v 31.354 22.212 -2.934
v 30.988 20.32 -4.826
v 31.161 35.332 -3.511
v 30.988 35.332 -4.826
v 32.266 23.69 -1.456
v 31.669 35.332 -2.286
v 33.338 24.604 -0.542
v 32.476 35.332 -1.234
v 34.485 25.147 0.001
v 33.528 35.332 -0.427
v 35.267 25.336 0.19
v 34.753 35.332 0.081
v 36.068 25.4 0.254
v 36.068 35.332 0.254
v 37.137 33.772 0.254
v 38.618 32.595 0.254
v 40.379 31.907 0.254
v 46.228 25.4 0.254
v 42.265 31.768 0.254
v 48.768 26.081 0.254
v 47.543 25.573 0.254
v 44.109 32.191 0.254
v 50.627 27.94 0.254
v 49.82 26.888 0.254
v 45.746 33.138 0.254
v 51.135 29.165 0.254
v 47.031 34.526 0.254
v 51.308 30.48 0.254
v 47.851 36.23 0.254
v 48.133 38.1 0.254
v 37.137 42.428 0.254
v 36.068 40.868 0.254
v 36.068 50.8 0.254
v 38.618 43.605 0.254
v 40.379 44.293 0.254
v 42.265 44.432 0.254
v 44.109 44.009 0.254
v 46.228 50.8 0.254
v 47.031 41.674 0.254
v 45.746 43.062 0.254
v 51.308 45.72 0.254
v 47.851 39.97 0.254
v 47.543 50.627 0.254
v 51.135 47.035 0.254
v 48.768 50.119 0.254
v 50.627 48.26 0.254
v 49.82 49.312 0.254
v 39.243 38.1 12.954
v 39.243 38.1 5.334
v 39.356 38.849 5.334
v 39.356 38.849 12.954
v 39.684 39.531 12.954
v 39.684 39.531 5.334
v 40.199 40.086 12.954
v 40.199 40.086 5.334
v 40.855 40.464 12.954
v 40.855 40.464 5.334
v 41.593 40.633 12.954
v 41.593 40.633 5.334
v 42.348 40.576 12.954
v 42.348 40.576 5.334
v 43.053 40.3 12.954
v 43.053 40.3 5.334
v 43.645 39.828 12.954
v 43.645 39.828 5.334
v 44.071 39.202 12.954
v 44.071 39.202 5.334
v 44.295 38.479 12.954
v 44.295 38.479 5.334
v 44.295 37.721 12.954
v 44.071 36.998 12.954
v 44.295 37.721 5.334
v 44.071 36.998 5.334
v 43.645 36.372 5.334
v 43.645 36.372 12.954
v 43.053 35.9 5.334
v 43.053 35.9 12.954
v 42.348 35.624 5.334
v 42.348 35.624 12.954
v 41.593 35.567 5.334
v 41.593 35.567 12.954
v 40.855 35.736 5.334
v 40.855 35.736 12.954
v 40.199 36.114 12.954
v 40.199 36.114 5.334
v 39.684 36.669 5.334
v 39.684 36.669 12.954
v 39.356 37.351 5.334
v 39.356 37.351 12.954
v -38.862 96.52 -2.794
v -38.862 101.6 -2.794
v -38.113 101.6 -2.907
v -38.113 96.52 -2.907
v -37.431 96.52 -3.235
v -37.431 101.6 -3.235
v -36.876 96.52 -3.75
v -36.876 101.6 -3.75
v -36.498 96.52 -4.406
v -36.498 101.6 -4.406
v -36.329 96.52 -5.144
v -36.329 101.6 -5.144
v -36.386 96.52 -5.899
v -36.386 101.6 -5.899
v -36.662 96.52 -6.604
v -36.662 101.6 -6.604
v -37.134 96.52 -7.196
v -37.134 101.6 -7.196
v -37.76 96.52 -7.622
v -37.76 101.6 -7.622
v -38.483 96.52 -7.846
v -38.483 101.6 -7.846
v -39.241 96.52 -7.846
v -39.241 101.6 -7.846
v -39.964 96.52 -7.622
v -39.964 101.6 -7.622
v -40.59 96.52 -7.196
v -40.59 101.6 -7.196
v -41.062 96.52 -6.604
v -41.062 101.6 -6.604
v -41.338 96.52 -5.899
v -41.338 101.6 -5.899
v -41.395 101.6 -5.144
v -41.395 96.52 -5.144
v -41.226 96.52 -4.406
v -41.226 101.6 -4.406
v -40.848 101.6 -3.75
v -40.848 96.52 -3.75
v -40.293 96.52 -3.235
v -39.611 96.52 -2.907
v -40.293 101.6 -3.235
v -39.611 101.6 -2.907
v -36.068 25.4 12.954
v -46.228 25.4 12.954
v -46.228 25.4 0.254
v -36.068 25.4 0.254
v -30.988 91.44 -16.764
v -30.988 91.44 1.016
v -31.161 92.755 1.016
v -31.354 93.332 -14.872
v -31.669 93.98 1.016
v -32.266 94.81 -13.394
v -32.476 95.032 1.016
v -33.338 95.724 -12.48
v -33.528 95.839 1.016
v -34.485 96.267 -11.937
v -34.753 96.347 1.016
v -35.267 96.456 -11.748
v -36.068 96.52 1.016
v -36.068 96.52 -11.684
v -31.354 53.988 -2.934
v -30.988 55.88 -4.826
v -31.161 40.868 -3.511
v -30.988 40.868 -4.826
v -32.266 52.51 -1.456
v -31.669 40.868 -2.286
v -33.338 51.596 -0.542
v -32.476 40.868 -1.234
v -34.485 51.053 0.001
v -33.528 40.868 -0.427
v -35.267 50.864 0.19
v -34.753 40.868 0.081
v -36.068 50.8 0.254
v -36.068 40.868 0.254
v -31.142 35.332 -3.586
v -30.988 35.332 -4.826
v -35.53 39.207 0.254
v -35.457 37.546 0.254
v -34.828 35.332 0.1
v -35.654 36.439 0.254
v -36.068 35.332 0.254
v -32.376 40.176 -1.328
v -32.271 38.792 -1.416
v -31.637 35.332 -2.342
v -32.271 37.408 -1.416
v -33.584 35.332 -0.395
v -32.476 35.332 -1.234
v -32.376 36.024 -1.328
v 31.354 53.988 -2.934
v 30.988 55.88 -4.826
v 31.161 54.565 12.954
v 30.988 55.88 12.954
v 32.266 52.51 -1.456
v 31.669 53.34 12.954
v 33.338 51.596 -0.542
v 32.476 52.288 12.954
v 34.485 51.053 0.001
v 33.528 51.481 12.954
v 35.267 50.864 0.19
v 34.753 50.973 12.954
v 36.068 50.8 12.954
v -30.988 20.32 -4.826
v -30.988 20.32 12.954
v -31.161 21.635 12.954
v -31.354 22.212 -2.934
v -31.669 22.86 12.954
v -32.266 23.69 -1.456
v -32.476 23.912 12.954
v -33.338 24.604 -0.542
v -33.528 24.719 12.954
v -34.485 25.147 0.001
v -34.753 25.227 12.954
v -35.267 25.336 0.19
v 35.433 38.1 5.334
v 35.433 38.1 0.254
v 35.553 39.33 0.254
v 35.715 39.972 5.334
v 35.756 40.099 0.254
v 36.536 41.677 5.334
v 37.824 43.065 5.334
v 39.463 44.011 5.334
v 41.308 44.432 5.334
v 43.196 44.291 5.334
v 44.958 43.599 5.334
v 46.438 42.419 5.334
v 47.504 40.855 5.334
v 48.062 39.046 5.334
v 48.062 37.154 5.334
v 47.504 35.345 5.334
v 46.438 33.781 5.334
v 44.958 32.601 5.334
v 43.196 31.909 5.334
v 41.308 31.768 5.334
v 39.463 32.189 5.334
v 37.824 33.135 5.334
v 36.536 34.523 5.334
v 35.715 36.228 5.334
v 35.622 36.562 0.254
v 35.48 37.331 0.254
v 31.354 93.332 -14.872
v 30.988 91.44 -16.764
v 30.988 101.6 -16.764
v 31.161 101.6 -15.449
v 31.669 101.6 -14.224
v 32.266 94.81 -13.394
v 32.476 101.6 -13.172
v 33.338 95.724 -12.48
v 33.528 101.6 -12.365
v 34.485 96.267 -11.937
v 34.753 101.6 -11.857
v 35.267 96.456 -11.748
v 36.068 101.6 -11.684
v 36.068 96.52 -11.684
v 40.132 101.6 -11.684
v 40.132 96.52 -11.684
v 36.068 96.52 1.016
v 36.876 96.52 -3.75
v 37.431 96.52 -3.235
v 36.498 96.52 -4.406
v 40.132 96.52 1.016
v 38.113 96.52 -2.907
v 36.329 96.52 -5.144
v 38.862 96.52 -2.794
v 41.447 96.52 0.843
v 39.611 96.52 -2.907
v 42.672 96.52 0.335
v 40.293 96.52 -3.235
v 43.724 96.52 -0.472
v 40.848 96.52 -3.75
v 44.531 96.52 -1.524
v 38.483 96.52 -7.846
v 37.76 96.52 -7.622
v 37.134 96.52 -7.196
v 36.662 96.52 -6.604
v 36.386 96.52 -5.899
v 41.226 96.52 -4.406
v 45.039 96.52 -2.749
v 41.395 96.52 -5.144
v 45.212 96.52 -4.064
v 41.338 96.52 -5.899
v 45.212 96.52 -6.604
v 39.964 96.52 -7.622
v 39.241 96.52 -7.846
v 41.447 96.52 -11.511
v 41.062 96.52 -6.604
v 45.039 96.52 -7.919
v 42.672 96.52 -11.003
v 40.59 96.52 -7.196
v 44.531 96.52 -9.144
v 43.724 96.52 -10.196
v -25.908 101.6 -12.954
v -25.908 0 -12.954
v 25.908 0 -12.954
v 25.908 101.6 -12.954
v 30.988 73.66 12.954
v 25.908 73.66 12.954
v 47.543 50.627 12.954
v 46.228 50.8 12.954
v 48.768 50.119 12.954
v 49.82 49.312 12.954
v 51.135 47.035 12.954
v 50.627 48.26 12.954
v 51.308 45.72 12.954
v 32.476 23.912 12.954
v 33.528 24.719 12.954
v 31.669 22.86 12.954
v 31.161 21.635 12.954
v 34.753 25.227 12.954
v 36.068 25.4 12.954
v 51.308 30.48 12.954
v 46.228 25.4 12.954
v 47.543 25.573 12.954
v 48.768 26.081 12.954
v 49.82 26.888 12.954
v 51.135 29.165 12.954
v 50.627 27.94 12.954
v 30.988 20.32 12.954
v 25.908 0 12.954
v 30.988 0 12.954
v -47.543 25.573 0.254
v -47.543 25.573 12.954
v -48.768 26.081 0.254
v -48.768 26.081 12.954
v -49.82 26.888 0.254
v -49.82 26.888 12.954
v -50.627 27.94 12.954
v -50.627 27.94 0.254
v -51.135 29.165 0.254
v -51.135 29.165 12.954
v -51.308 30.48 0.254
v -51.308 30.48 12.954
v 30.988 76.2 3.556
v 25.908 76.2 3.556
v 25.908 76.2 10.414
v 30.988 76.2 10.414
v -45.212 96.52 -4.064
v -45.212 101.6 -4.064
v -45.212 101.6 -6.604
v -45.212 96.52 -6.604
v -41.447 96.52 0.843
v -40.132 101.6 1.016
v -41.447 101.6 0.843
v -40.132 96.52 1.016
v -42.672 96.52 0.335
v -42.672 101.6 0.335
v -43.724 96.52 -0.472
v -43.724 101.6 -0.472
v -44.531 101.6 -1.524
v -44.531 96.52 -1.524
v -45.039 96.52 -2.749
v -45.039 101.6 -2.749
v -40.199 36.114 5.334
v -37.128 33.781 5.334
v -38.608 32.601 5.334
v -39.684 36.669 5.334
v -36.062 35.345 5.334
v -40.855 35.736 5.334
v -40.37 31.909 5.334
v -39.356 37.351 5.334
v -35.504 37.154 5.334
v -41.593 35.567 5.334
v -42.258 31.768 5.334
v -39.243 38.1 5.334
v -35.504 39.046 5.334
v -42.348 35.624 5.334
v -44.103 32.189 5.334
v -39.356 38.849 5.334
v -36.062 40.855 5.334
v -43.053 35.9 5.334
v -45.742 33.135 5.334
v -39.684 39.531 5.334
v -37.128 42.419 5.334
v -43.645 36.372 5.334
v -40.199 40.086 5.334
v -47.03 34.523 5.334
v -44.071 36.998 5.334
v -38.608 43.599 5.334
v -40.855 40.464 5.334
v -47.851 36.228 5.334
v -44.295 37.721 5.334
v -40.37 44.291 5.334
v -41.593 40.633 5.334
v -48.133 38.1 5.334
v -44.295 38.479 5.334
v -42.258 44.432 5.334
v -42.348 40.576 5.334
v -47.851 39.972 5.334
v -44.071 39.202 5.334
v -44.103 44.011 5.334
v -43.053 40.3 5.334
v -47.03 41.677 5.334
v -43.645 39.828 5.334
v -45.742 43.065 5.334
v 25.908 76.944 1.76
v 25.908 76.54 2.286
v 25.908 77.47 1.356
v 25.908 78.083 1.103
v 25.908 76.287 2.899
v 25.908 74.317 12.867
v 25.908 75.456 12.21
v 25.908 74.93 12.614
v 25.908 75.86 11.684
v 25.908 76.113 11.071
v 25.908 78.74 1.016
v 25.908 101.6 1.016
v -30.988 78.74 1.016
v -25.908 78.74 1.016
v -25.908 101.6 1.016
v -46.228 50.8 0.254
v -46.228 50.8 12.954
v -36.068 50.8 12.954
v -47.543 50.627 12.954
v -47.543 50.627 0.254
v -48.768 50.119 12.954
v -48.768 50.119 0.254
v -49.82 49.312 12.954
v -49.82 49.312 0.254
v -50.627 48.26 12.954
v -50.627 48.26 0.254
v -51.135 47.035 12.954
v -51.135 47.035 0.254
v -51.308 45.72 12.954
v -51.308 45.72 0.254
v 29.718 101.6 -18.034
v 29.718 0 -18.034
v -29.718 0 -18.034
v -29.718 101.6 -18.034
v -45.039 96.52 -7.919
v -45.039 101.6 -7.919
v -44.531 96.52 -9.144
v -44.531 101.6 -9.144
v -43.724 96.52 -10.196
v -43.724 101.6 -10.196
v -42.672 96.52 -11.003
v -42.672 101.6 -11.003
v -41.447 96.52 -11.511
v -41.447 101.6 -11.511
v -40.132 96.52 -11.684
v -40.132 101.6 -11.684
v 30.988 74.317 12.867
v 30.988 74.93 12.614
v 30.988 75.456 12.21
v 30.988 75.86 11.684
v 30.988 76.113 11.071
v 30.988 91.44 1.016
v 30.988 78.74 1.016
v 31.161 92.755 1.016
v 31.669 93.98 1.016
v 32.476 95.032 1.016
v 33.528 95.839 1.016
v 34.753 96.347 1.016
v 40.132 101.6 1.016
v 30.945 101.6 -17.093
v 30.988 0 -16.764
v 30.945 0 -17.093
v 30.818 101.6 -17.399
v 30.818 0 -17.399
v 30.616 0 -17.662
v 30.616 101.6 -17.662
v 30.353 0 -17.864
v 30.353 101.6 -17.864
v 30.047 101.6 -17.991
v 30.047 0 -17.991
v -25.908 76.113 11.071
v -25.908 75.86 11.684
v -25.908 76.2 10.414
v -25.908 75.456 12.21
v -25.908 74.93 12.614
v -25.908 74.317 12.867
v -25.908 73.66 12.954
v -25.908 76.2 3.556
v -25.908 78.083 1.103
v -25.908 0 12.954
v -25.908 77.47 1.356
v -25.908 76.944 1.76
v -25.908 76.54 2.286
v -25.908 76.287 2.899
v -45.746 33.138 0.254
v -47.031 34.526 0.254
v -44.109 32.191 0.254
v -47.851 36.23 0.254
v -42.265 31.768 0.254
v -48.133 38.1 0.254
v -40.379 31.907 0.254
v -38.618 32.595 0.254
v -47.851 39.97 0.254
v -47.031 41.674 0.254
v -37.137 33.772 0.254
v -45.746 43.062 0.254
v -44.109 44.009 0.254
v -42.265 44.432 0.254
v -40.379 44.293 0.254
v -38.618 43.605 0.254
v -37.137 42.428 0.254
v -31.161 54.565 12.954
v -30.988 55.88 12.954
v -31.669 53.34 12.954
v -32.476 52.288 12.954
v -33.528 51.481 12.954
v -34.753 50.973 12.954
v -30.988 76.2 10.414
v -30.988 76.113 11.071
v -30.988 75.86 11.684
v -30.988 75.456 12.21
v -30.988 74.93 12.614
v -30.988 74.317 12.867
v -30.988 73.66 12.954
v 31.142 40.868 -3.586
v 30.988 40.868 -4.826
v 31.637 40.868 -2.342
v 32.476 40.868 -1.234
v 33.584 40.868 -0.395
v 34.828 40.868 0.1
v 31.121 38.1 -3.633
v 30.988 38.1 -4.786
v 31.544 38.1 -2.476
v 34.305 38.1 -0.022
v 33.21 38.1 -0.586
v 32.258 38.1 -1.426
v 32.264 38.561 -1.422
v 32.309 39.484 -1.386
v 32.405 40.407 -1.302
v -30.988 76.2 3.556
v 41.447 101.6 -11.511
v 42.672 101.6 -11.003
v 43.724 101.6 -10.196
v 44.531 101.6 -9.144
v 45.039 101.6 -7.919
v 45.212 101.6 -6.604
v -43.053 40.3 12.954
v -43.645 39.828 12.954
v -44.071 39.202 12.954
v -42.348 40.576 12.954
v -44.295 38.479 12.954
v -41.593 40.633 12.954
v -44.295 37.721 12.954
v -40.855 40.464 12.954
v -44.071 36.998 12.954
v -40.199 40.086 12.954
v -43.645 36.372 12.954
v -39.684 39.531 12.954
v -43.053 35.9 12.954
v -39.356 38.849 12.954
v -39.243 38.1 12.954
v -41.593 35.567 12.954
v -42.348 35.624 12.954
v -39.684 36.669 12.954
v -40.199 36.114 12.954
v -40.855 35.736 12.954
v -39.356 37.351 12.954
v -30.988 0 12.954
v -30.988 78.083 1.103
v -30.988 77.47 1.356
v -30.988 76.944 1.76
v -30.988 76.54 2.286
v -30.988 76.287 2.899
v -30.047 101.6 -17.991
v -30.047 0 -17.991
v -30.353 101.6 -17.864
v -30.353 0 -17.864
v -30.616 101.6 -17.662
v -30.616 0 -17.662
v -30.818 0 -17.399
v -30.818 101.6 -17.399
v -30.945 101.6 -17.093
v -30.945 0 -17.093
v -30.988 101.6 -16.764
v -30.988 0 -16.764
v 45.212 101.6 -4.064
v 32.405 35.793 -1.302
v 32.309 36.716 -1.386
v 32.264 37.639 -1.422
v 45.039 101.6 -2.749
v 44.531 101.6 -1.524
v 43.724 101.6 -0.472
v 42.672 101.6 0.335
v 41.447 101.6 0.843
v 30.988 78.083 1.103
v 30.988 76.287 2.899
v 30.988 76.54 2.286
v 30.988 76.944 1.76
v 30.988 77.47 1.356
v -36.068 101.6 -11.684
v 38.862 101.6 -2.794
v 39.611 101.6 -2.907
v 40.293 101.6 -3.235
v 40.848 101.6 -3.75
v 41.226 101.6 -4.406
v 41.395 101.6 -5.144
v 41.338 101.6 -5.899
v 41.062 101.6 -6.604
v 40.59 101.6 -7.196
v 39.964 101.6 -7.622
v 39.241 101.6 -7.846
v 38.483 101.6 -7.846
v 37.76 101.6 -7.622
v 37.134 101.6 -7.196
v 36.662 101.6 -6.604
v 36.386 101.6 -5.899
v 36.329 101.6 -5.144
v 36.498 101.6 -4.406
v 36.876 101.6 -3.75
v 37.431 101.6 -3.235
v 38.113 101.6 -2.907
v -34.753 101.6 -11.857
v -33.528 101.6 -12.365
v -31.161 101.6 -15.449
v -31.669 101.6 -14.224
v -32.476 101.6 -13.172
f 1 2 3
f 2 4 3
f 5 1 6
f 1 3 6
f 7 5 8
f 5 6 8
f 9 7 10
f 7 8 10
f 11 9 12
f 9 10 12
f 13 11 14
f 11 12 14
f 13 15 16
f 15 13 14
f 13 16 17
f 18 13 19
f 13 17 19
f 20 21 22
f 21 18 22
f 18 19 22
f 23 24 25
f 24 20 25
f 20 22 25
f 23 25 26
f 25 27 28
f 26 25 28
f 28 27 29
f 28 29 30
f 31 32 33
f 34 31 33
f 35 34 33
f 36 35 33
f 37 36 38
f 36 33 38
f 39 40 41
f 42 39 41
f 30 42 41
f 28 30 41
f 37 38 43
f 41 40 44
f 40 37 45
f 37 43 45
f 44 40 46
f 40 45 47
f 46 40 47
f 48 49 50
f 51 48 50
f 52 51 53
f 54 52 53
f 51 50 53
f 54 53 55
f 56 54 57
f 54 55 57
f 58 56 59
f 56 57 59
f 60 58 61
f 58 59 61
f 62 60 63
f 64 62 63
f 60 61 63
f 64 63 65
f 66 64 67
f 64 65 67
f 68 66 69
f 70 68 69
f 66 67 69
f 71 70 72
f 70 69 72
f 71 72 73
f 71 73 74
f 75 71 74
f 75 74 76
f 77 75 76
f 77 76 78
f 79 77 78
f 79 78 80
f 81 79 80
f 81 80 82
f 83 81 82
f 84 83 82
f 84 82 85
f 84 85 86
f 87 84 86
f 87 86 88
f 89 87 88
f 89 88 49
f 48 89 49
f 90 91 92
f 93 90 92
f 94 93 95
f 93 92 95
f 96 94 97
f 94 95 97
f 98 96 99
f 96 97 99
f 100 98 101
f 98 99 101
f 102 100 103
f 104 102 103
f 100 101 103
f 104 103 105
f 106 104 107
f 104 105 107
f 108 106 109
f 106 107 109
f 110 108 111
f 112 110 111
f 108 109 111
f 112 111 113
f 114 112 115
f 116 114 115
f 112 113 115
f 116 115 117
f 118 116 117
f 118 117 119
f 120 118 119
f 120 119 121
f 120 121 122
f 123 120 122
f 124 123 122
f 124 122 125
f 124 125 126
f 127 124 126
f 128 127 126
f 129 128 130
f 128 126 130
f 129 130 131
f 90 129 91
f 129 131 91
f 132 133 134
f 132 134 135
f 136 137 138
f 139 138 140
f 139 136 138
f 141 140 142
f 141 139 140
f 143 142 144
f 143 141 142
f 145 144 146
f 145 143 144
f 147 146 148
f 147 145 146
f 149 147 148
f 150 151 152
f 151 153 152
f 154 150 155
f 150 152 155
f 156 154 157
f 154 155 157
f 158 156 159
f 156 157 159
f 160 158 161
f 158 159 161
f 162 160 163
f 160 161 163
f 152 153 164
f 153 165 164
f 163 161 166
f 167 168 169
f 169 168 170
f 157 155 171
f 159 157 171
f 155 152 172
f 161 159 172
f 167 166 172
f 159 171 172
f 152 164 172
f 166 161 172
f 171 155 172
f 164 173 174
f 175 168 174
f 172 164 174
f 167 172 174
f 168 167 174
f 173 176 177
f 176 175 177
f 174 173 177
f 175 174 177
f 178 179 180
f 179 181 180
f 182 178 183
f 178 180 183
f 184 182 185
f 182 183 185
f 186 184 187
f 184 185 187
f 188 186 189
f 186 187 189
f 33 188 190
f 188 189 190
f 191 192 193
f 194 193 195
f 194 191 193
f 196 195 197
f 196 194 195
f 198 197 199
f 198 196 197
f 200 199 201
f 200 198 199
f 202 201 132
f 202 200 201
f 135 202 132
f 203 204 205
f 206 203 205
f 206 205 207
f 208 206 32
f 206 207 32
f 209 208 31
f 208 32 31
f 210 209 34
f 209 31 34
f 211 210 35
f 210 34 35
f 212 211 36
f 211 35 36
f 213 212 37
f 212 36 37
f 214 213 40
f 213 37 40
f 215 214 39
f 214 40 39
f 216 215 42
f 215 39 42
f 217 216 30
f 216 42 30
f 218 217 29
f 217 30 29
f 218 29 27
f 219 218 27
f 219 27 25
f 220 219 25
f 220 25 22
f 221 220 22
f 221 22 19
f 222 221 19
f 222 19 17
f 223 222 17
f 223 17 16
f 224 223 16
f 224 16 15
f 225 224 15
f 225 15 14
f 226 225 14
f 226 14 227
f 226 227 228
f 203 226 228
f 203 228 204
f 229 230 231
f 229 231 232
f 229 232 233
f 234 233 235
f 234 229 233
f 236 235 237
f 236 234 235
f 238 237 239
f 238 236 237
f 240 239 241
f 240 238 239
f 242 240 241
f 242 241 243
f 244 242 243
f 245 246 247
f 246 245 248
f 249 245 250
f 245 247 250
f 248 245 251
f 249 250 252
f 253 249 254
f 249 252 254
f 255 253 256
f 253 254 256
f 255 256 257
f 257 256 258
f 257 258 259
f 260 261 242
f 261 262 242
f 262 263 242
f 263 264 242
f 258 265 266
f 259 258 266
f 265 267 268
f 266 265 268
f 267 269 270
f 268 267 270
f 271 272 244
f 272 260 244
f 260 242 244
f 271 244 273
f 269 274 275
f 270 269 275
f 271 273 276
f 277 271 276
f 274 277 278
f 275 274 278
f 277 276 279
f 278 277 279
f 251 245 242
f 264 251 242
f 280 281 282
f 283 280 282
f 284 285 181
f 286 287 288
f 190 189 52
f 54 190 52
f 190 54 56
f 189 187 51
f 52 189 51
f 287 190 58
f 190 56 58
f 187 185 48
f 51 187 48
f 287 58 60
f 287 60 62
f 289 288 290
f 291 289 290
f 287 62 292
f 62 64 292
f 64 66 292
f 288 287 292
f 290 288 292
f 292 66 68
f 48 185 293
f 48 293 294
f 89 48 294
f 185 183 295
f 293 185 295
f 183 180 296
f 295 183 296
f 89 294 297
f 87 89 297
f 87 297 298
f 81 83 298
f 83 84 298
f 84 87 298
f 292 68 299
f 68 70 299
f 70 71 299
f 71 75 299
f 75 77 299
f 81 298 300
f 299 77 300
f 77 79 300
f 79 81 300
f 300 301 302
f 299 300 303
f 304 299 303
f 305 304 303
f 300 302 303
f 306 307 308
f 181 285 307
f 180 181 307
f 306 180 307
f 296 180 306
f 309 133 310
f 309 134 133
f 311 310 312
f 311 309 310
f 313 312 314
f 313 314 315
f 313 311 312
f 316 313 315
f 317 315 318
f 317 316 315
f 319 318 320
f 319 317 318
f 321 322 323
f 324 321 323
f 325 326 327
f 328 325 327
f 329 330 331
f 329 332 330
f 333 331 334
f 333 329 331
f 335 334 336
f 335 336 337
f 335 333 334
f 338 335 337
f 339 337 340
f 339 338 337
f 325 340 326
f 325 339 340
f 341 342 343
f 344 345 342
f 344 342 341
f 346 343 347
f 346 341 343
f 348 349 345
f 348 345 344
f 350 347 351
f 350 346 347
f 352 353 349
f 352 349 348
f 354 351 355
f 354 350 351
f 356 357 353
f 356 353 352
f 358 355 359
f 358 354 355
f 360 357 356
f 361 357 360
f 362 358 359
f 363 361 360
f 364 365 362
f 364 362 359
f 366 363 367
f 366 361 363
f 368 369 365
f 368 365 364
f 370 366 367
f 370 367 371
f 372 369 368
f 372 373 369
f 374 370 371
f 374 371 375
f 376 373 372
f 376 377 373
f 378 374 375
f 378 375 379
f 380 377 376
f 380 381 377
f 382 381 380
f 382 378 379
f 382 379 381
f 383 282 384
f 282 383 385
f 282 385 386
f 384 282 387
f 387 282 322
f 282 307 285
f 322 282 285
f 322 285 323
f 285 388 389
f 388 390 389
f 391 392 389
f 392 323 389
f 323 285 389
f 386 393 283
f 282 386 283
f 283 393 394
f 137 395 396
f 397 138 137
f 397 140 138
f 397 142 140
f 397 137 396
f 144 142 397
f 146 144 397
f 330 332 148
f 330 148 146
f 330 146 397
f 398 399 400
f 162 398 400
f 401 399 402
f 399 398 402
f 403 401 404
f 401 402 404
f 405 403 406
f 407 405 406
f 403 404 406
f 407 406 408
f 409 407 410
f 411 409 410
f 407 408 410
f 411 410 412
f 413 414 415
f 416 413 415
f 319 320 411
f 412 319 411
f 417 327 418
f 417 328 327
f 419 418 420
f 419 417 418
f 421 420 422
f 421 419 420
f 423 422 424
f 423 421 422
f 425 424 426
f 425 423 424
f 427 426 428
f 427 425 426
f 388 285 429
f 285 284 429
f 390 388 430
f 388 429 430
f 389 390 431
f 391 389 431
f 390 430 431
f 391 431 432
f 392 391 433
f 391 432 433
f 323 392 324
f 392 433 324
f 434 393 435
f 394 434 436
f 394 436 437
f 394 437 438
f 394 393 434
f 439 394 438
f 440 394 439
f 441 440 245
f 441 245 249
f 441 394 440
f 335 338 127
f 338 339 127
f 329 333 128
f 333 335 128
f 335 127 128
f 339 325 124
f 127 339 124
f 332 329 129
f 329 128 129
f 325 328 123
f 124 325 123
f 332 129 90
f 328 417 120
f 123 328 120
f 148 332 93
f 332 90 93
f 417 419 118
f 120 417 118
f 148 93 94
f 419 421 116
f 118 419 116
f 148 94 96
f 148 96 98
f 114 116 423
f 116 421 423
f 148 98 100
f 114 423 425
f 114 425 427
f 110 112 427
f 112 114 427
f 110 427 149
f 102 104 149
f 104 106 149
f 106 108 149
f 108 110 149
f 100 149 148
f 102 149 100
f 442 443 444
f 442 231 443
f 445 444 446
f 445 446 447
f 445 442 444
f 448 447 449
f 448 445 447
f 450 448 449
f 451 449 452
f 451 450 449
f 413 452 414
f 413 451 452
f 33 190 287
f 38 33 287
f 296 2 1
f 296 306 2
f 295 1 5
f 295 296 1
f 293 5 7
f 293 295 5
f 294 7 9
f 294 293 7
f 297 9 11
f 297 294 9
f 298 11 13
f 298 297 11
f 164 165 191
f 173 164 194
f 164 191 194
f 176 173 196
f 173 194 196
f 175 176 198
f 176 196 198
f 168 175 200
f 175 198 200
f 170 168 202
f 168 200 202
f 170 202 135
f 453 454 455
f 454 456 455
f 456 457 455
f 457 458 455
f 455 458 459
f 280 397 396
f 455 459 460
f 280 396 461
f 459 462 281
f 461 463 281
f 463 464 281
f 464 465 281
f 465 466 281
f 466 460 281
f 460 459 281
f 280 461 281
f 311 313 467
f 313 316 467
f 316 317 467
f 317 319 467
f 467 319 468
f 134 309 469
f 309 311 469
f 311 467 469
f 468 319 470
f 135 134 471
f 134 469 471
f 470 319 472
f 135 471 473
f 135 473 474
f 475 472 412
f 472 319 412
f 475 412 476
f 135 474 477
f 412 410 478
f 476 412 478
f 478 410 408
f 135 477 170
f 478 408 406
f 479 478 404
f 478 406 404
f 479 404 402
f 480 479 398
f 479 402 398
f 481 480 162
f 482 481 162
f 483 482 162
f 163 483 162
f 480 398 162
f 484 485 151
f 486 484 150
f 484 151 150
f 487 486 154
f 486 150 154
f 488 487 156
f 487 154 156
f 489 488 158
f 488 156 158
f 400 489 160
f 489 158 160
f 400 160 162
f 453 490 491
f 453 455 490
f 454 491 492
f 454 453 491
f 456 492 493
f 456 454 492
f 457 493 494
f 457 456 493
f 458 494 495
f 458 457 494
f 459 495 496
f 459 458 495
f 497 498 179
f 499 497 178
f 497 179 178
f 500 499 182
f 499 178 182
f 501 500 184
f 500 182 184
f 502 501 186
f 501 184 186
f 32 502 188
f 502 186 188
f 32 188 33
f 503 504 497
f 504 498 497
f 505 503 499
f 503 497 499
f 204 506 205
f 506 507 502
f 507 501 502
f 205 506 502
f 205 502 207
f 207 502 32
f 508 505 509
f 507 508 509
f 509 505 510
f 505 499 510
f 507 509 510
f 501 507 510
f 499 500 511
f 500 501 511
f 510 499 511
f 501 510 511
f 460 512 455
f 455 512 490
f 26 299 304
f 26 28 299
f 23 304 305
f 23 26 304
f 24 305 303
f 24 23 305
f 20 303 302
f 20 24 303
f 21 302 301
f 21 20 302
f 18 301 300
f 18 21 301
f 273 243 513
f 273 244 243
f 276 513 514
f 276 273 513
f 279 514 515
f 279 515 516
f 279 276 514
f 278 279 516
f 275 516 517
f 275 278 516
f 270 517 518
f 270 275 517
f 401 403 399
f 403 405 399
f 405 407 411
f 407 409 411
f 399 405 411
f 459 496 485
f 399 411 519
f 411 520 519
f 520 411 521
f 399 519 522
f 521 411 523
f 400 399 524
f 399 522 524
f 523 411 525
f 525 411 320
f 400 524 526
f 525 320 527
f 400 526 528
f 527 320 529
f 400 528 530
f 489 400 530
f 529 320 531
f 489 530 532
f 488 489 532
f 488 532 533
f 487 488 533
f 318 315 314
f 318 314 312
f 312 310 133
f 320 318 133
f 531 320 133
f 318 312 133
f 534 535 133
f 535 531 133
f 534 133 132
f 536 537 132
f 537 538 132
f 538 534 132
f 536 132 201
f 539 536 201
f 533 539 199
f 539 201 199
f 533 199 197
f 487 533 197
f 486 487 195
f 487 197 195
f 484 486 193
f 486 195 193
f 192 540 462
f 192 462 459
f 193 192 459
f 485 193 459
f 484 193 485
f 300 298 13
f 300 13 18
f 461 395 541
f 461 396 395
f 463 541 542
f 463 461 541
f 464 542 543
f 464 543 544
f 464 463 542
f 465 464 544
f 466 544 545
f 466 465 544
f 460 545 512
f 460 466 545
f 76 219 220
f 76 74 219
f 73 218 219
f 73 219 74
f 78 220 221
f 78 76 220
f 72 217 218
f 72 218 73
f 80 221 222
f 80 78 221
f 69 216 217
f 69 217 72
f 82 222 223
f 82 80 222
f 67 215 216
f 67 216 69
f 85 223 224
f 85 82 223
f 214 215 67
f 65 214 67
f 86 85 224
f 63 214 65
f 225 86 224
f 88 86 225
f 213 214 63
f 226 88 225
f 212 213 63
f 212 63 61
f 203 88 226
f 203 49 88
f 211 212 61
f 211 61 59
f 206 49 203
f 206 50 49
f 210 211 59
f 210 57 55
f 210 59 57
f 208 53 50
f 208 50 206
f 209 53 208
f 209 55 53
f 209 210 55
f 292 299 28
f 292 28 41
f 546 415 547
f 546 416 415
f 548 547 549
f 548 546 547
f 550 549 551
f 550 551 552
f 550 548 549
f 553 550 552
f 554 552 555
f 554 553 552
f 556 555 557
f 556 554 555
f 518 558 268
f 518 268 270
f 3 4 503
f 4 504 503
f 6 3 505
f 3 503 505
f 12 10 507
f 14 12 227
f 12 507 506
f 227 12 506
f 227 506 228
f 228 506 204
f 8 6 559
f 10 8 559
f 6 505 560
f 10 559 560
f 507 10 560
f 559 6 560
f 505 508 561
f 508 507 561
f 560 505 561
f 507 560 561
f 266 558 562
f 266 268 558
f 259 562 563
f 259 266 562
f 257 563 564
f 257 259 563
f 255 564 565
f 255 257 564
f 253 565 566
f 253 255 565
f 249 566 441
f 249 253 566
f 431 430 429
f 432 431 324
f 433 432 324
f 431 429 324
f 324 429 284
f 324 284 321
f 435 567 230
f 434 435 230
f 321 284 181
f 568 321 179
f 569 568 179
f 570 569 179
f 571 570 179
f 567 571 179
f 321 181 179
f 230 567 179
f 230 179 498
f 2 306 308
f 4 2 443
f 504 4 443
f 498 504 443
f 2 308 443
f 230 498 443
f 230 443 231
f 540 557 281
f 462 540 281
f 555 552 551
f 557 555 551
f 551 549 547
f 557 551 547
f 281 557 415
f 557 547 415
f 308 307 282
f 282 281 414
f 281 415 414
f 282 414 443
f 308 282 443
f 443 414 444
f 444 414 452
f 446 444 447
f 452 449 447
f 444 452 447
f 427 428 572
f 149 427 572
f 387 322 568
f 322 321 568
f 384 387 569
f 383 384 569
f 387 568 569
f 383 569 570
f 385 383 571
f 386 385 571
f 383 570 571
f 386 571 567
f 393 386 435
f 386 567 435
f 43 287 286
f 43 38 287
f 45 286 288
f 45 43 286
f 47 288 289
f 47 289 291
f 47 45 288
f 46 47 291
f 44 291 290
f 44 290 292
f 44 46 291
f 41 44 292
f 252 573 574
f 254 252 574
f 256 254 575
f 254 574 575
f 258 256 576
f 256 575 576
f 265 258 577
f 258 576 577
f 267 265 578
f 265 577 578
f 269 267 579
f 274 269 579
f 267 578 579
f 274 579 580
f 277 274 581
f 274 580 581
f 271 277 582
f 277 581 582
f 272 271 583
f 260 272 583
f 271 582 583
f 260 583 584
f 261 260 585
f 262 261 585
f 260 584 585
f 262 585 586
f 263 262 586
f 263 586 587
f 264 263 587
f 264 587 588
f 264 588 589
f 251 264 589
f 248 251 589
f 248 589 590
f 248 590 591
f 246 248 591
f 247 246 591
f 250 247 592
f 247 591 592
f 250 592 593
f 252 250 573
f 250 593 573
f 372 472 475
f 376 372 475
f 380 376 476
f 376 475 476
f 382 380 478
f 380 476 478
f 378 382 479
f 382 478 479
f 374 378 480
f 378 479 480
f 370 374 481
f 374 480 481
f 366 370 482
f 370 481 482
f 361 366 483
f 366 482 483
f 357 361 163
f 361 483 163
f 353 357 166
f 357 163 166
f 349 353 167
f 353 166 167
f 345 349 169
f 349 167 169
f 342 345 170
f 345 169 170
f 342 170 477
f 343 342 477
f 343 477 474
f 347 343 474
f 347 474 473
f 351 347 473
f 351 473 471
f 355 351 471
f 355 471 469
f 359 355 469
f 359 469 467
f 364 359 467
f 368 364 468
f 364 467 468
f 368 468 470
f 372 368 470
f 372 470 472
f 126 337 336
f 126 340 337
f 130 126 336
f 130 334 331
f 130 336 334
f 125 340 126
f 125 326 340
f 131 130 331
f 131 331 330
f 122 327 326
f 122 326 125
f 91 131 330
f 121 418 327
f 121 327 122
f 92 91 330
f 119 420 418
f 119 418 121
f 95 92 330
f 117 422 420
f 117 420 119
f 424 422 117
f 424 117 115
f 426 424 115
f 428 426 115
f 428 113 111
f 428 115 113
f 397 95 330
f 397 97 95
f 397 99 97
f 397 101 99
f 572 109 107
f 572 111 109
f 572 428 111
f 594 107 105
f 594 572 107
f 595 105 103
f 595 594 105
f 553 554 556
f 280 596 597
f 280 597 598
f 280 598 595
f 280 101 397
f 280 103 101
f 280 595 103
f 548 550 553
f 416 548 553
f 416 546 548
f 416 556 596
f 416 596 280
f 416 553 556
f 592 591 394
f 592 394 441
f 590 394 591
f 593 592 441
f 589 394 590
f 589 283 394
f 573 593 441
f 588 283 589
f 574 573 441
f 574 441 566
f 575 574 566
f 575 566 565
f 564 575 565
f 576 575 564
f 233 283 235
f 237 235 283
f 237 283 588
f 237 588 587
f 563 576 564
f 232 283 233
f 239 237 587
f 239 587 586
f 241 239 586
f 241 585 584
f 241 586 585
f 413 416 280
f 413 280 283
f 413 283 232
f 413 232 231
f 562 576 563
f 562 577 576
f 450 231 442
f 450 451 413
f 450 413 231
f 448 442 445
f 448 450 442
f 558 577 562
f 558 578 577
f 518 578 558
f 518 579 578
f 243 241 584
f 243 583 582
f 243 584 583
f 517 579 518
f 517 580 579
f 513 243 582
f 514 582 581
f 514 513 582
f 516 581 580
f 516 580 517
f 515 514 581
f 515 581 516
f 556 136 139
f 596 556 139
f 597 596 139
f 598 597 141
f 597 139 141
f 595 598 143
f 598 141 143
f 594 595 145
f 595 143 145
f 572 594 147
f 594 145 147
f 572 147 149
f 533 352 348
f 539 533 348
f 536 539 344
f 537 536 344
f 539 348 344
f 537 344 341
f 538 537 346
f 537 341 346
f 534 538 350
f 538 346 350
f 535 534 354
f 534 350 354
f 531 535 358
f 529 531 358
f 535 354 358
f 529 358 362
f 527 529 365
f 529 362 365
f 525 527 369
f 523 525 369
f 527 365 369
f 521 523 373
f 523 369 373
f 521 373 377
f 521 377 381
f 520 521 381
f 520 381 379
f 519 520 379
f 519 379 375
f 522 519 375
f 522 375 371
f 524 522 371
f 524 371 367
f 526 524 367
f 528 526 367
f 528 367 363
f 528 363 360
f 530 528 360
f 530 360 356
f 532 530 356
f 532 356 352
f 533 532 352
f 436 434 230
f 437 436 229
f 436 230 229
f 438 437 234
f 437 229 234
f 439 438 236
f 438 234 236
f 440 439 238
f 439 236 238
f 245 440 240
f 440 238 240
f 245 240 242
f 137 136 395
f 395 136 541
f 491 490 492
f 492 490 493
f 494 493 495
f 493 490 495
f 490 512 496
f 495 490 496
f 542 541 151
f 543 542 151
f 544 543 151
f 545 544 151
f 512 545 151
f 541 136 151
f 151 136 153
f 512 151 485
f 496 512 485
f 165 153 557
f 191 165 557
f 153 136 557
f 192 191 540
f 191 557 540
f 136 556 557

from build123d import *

# Parameters (mm, degrees)
BOSS_EXTRUDE1_DEPTH = 101.6
SKETCH2_W           = 25.4
SKETCH2_H           = 25.4
BOSS_EXTRUDE2_DEPTH = 12.7
SKETCH3_R           = 2.54
CUT_EXTRUDE1_DEPTH  = 116.280188272
SKETCH4_R           = 6.35
CUT_EXTRUDE2_DEPTH  = 5.08
FILLET1_R           = 5.08
SKETCH5_W           = 14.224
SKETCH5_H           = 12.7
SKETCH5_R           = 2.54
BOSS_EXTRUDE3_DEPTH = 5.08
FILLET2_R           = 5.08
FILLET3_R           = 5.08
SKETCH6_W           = 11.938
SKETCH6_H           = 25.4
CUT_EXTRUDE3_DEPTH  = 132.986426559
FILLET4_R           = 2.54
FILLET5_R           = 1.27


with BuildPart() as part:
    # Sketch1 → Boss-Extrude1 (new body)
    with BuildSketch(Plane(origin=(0, 0, 0), x_dir=(1, 0, 0), z_dir=(0, 1, 0))):
        Polygon((-25.908, -12.954), (-25.908, 12.954), (25.908, 12.954), (25.908, -12.954), (30.988, -12.954), (30.988, 18.034), (-30.988, 18.034), (-30.988, -12.954), align=None)
    extrude(amount=BOSS_EXTRUDE1_DEPTH)

    # Sketch2 → Boss-Extrude2 (add)
    with BuildSketch(Plane.XY.offset(12.954)):
        with Locations((38.608, 38.1)):
            Rectangle(SKETCH2_W, SKETCH2_H)
        with Locations((-38.608, 38.1)):
            Rectangle(SKETCH2_W, SKETCH2_H)
    extrude(amount=-BOSS_EXTRUDE2_DEPTH)

    # Sketch3 → Cut-Extrude1 (cut, through all)
    with BuildSketch(Plane(origin=(0, 0, 0.254), x_dir=(-1, 0, 0), z_dir=(0, 0, -1))):
        with Locations((-41.783, 38.1)):
            Circle(SKETCH3_R)
        with Locations(Location((41.783, 38.1, 0), (0, 0, 180))):
            Circle(SKETCH3_R)
    extrude(amount=-CUT_EXTRUDE1_DEPTH, mode=Mode.SUBTRACT)

    # Sketch4 → Cut-Extrude2 (cut)
    with BuildSketch(Plane(origin=(0, 0, 0.254), x_dir=(-1, 0, 0), z_dir=(0, 0, -1))):
        with Locations((-41.783, 38.1)):
            Circle(SKETCH4_R)
        with Locations((41.783, 38.1)):
            Circle(SKETCH4_R)
    extrude(amount=-CUT_EXTRUDE2_DEPTH, mode=Mode.SUBTRACT)

    # Fillet1
    fillet1_edges = [part.edges().sort_by_distance(p)[0] for p in [
        (51.308, 25.4, 6.604),
        (30.988, 50.8, 6.604),
        (51.308, 50.8, 6.604),
        (30.988, 25.4, 6.604),
        (30.988, 38.1, 0.254),
        (-30.988, 25.4, 6.604),
        (-51.308, 25.4, 6.604),
        (-30.988, 50.8, 6.604),
        (-51.308, 50.8, 6.604),
        (-30.988, 38.1, 0.254),
    ]]
    fillet(fillet1_edges, radius=FILLET1_R)

    # Sketch5 → Boss-Extrude3 (add)
    # profile 1 of 2: a face of its own
    with BuildSketch(Plane(origin=(0, 101.6, 0), x_dir=(1, 0, 0), z_dir=(0, 1, 0))):
        with Locations((38.1, 5.334)):
            Rectangle(SKETCH5_W, SKETCH5_H)
        with Locations(Location((38.862, 5.334, 0), (0, 0, 270))):
            Circle(SKETCH5_R, mode=Mode.SUBTRACT)
    # profile 2 of 2: a face of its own
    with BuildSketch(Plane(origin=(0, 101.6, 0), x_dir=(1, 0, 0), z_dir=(0, 1, 0))):
        with Locations((-38.1, 5.334)):
            Rectangle(SKETCH5_W, SKETCH5_H)
        with Locations(Location((-38.862, 5.334, 0), (0, 0, 270))):
            Circle(SKETCH5_R, mode=Mode.SUBTRACT)
    extrude(amount=-BOSS_EXTRUDE3_DEPTH)

    # Fillet2
    fillet2_edges = [part.edges().sort_by_distance(p)[0] for p in [
        (-30.988, 99.06, -11.684),
        (-30.988, 96.52, -5.334),
        (30.988, 99.06, -11.684),
        (30.988, 96.52, -5.334),
    ]]
    fillet(fillet2_edges, radius=FILLET2_R)

    # Fillet3
    fillet3_edges = [part.edges().sort_by_distance(p)[0] for p in [
        (-45.212, 99.06, -11.684),
        (-45.212, 99.06, 1.016),
        (45.212, 99.06, -11.684),
        (45.212, 99.06, 1.016),
    ]]
    fillet(fillet3_edges, radius=FILLET3_R)

    # Sketch6 → Cut-Extrude3 (cut, through all)
    with BuildSketch(Plane.ZY.offset(30.988)):
        with Locations((6.985, 88.9)):
            Rectangle(SKETCH6_W, SKETCH6_H)
    extrude(amount=-CUT_EXTRUDE3_DEPTH, mode=Mode.SUBTRACT)

    # Fillet4
    fillet4_edges = [part.edges().sort_by_distance(p)[0] for p in [
        (28.448, 76.2, 12.954),
        (28.448, 76.2, 1.016),
        (-28.448, 76.2, 1.016),
        (-28.448, 76.2, 12.954),
    ]]
    fillet(fillet4_edges, radius=FILLET4_R)

    # Fillet5
    fillet5_edges = [part.edges().sort_by_distance(p)[0] for p in [
        (30.988, 50.8, -18.034),
        (-30.988, 50.8, -18.034),
    ]]
    fillet(fillet5_edges, radius=FILLET5_R - 0.0001)  # a hair under: the kernel refuses the full size


solid = part.part
